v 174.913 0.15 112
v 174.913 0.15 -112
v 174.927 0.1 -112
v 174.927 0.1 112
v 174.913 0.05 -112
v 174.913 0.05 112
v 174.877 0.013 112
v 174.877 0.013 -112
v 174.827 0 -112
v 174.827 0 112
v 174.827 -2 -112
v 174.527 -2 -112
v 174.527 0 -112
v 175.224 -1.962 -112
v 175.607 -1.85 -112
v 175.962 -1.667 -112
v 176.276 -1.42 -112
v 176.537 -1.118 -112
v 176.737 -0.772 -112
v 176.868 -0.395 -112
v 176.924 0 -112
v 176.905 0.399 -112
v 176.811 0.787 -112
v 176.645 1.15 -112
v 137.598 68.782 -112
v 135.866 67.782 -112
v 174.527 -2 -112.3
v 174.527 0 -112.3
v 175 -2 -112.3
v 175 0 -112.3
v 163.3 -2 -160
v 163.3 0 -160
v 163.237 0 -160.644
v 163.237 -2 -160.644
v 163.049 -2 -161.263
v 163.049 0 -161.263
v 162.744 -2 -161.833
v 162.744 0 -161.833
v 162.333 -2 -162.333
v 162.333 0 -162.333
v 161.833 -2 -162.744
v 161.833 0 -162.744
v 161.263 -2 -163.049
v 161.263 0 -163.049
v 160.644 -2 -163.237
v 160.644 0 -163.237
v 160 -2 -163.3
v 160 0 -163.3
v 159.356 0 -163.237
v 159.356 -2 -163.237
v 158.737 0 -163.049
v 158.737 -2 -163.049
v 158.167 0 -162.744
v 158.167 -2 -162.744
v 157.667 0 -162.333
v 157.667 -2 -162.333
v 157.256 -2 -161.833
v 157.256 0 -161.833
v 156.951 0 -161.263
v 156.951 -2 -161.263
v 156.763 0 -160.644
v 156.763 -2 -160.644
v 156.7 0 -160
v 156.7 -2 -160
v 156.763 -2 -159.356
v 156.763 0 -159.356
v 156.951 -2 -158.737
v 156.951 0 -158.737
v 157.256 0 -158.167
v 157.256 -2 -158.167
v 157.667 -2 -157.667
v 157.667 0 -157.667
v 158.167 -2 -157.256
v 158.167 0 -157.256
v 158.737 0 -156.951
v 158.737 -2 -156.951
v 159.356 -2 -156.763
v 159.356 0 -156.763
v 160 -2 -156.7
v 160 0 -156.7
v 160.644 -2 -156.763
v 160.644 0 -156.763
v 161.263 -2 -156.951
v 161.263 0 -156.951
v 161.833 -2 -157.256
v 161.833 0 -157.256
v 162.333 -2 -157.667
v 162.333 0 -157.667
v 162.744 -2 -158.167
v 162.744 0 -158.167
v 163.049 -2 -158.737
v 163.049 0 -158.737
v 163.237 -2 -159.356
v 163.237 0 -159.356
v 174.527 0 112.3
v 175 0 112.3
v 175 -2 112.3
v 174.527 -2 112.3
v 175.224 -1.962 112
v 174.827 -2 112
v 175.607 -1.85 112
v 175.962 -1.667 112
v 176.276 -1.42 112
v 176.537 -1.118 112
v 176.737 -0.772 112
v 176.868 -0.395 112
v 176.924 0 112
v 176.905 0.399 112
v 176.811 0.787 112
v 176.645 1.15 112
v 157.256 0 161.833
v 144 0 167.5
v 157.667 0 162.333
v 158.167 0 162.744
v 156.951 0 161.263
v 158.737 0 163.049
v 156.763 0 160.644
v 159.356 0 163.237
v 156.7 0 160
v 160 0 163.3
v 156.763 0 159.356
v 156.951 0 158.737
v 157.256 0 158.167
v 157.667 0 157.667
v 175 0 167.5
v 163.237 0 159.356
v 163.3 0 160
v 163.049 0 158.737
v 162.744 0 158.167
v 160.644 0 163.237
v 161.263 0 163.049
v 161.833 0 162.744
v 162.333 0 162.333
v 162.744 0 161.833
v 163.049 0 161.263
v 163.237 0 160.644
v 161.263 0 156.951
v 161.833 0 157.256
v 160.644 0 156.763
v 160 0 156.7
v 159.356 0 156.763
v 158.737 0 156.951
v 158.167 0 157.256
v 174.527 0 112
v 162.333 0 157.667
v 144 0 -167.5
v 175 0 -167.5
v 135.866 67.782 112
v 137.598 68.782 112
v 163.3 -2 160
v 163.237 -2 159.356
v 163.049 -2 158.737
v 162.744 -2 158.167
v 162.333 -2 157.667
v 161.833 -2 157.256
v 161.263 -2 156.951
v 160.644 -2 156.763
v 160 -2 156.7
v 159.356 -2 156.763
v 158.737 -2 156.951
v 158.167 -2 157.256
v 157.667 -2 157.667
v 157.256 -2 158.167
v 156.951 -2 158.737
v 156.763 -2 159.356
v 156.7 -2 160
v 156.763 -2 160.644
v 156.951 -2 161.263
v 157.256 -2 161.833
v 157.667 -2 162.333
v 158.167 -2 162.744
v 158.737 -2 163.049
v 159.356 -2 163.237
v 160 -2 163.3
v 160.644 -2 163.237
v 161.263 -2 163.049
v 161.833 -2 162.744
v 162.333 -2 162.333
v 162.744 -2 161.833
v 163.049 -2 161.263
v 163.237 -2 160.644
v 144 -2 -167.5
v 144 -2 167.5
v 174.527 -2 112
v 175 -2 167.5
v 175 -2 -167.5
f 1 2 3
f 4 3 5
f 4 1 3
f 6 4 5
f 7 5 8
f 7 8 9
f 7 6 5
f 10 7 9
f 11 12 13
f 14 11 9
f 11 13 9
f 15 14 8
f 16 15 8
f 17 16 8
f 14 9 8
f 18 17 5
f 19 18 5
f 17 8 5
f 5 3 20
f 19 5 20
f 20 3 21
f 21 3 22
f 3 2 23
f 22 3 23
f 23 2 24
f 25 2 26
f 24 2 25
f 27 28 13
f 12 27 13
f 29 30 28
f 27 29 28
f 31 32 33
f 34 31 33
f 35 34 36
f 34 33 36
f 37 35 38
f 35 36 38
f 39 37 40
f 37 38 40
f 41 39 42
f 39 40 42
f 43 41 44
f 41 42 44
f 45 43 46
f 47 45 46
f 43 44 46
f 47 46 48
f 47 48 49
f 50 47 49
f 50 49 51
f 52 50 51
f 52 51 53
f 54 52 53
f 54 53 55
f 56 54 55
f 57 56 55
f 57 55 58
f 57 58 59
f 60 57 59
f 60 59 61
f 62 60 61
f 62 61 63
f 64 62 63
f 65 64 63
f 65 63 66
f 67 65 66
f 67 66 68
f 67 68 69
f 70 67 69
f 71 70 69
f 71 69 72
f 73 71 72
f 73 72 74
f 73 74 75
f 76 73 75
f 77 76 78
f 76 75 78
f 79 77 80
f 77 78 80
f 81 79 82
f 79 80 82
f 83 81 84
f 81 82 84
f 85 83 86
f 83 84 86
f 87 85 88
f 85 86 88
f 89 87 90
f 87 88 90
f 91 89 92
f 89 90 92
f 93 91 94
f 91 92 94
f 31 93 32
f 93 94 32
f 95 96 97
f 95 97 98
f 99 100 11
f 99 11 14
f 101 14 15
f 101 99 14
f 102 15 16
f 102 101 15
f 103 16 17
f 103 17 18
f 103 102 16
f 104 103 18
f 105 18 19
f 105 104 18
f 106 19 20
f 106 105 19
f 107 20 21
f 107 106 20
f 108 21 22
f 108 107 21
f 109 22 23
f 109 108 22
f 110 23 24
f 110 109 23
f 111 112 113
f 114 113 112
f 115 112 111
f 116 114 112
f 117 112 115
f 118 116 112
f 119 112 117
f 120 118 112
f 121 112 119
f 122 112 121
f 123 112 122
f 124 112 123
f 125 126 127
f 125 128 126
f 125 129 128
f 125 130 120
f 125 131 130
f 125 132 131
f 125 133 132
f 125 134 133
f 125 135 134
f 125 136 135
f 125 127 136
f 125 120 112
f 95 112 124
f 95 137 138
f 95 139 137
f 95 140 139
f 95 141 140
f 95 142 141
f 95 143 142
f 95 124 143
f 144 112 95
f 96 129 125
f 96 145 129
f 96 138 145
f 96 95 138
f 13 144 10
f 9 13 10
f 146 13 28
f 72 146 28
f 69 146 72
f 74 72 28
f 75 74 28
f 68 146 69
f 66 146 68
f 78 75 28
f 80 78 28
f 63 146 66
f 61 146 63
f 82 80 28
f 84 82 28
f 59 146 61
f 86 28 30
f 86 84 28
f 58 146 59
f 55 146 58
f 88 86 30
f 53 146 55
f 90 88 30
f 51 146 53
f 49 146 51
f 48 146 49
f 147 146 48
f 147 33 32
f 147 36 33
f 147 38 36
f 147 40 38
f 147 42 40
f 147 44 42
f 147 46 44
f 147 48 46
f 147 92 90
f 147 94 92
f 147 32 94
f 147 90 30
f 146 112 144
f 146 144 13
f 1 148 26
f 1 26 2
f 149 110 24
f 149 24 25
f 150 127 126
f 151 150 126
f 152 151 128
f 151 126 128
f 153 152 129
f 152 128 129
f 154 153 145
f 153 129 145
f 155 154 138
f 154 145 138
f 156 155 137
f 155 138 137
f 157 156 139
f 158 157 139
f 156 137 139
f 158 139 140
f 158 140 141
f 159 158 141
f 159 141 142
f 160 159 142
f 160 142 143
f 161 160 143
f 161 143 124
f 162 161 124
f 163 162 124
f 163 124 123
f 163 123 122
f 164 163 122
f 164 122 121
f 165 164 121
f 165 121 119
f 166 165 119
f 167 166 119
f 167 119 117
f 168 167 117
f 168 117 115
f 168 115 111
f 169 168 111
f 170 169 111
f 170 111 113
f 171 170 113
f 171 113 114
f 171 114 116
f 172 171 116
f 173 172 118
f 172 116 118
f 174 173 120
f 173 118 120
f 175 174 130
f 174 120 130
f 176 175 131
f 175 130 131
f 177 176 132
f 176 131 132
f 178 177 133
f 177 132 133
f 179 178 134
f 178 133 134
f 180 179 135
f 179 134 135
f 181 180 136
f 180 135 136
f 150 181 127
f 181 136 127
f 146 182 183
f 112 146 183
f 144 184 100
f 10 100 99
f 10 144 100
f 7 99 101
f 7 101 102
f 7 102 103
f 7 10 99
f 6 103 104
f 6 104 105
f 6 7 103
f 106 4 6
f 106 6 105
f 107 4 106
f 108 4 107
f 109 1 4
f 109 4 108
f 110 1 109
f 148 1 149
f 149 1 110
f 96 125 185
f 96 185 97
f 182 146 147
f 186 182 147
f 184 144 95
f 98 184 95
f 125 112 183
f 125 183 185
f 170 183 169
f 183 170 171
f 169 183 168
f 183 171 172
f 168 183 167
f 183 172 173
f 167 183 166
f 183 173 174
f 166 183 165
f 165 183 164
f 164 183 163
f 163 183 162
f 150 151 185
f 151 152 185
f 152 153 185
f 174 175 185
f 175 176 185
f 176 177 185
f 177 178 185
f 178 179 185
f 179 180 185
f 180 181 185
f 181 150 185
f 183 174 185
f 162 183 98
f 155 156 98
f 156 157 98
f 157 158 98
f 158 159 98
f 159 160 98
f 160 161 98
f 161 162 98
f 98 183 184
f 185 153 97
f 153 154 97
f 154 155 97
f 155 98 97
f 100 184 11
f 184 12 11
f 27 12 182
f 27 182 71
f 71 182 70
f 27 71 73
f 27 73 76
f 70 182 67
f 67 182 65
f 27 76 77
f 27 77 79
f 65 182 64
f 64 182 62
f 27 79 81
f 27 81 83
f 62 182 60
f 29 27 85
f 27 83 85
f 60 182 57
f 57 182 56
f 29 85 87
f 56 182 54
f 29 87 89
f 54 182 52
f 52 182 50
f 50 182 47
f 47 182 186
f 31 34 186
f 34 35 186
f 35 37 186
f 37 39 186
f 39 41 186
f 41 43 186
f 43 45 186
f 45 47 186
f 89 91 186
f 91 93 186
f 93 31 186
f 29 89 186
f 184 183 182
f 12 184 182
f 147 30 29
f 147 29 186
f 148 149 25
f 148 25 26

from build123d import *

# Parameters (mm, degrees)
SKIZZE2_W                       = 350
SKIZZE2_H                       = 335
BASIS_BLECH1_DEPTH              = 2
KANTE_LASCHE1_STRIP_CUT_DEPTH   = 224
KANTE_LASCHE1_RELIEF_W          = 14.502816622
KANTE_LASCHE1_RELIEF_H          = 0.3
KANTE_LASCHE1_RELIEF_CUT_DEPTH  = 2
KANTE_LASCHE1_DEPTH             = 224
DURCHGANGSLOCH_F_R_M61_D        = 6.6
DURCHGANGSLOCH_F_R_M61_DEPTH    = 15
DURCHGANGSLOCH_F_R_M61_TIP      = 1.982840043
DURCHGANGSLOCH_F_R_M121_D       = 13.5
SKIZZE30_W                      = 319
SKIZZE30_H                      = 335
SCHNITT_LINEAR_AUSTRAGEN1_DEPTH = 10


# Sheet-metal steps are written as plain solids
with BuildPart() as part:
    # Skizze2 → Basis-Blech1 (new body)
    with BuildSketch(Plane(origin=(0, 0, 0), x_dir=(1, 0, 0), z_dir=(0, 1, 0))):
        Rectangle(SKIZZE2_W, SKIZZE2_H)
    extrude(amount=-BASIS_BLECH1_DEPTH)

    # Kante-Lasche1 strip (across the edge) → Kante-Lasche1 strip cut (cut)
    with BuildSketch(Plane(origin=(175, 0, 112), x_dir=(-0.8660254037844407, -0.49999999999999645, 0), z_dir=(0, 0, -1))):
        Polygon((-11.15, -8.746856578), (1.15, -1.645448267), (0.15, 0.08660254), (-12.15, -7.014805771), align=None)
    extrude(amount=KANTE_LASCHE1_STRIP_CUT_DEPTH, mode=Mode.SUBTRACT)

    # Kante-Lasche1 relief (on the sheet) → Kante-Lasche1 relief cut (cut)
    with BuildSketch(Plane(origin=(174.826794919, 0, 112), x_dir=(-1, 0, 0), z_dir=(0, 1, 0))):
        with Locations((-6.951408311, 0.15)):
            Rectangle(KANTE_LASCHE1_RELIEF_W, KANTE_LASCHE1_RELIEF_H)
        with Locations((-6.951408311, -224.15)):
            Rectangle(KANTE_LASCHE1_RELIEF_W, KANTE_LASCHE1_RELIEF_H)
    extrude(amount=-KANTE_LASCHE1_RELIEF_CUT_DEPTH, mode=Mode.SUBTRACT)

    # Kante-Lasche1 section (across the edge) → Kante-Lasche1 (add)
    with BuildSketch(Plane(origin=(175, 0, 112), x_dir=(-0.8660254037844407, -0.49999999999999645, 0), z_dir=(0, 0, -1))):
        with BuildLine():
            Line((-2, 0.173205081), (-2, 78.267949192))
            Line((-2, 78.267949192), (0, 78.267949192))
            Line((0, 78.267949192), (0, 0.173205081))
            ThreePointArc((0, 0.173205081), (0.05, 0.08660254), (0.15, 0.08660254))
            Line((0.15, 0.08660254), (1.15, -1.645448267))
            ThreePointArc((1.15, -1.645448267), (-0.95, -1.645448267), (-2, 0.173205081))
        make_face()
    extrude(amount=KANTE_LASCHE1_DEPTH)

    # Durchgangsloch für M61
    with Locations(Plane(origin=(0, -2, 0), x_dir=(-1, 0, 0), z_dir=(0, -1, 0))):
        with Locations((-160, -160), (160, -160), (160, 160), (-160, 160)):
            Hole(DURCHGANGSLOCH_F_R_M61_D / 2, depth=DURCHGANGSLOCH_F_R_M61_DEPTH)
            with Locations((0, 0, -(DURCHGANGSLOCH_F_R_M61_DEPTH + DURCHGANGSLOCH_F_R_M61_TIP / 2))):  # 118° drill point
                Cone(0, DURCHGANGSLOCH_F_R_M61_D / 2, DURCHGANGSLOCH_F_R_M61_TIP, mode=Mode.SUBTRACT)

    # Durchgangsloch für M121 (through all)
    with Locations(Plane(origin=(0, 0, 0), x_dir=(1, 0, 0), z_dir=(0, 1, 0))):
        with Locations((-25, 145.5), (-25, -145.5)):
            Hole(DURCHGANGSLOCH_F_R_M121_D / 2)

    # Skizze30 → Schnitt-Linear austragen1 (cut)
    with BuildSketch(Plane.XZ.offset(2)):
        with Locations((-15.5, 0)):
            Rectangle(SKIZZE30_W, SKIZZE30_H)
    extrude(amount=-SCHNITT_LINEAR_AUSTRAGEN1_DEPTH, mode=Mode.SUBTRACT)


solid = part.part
